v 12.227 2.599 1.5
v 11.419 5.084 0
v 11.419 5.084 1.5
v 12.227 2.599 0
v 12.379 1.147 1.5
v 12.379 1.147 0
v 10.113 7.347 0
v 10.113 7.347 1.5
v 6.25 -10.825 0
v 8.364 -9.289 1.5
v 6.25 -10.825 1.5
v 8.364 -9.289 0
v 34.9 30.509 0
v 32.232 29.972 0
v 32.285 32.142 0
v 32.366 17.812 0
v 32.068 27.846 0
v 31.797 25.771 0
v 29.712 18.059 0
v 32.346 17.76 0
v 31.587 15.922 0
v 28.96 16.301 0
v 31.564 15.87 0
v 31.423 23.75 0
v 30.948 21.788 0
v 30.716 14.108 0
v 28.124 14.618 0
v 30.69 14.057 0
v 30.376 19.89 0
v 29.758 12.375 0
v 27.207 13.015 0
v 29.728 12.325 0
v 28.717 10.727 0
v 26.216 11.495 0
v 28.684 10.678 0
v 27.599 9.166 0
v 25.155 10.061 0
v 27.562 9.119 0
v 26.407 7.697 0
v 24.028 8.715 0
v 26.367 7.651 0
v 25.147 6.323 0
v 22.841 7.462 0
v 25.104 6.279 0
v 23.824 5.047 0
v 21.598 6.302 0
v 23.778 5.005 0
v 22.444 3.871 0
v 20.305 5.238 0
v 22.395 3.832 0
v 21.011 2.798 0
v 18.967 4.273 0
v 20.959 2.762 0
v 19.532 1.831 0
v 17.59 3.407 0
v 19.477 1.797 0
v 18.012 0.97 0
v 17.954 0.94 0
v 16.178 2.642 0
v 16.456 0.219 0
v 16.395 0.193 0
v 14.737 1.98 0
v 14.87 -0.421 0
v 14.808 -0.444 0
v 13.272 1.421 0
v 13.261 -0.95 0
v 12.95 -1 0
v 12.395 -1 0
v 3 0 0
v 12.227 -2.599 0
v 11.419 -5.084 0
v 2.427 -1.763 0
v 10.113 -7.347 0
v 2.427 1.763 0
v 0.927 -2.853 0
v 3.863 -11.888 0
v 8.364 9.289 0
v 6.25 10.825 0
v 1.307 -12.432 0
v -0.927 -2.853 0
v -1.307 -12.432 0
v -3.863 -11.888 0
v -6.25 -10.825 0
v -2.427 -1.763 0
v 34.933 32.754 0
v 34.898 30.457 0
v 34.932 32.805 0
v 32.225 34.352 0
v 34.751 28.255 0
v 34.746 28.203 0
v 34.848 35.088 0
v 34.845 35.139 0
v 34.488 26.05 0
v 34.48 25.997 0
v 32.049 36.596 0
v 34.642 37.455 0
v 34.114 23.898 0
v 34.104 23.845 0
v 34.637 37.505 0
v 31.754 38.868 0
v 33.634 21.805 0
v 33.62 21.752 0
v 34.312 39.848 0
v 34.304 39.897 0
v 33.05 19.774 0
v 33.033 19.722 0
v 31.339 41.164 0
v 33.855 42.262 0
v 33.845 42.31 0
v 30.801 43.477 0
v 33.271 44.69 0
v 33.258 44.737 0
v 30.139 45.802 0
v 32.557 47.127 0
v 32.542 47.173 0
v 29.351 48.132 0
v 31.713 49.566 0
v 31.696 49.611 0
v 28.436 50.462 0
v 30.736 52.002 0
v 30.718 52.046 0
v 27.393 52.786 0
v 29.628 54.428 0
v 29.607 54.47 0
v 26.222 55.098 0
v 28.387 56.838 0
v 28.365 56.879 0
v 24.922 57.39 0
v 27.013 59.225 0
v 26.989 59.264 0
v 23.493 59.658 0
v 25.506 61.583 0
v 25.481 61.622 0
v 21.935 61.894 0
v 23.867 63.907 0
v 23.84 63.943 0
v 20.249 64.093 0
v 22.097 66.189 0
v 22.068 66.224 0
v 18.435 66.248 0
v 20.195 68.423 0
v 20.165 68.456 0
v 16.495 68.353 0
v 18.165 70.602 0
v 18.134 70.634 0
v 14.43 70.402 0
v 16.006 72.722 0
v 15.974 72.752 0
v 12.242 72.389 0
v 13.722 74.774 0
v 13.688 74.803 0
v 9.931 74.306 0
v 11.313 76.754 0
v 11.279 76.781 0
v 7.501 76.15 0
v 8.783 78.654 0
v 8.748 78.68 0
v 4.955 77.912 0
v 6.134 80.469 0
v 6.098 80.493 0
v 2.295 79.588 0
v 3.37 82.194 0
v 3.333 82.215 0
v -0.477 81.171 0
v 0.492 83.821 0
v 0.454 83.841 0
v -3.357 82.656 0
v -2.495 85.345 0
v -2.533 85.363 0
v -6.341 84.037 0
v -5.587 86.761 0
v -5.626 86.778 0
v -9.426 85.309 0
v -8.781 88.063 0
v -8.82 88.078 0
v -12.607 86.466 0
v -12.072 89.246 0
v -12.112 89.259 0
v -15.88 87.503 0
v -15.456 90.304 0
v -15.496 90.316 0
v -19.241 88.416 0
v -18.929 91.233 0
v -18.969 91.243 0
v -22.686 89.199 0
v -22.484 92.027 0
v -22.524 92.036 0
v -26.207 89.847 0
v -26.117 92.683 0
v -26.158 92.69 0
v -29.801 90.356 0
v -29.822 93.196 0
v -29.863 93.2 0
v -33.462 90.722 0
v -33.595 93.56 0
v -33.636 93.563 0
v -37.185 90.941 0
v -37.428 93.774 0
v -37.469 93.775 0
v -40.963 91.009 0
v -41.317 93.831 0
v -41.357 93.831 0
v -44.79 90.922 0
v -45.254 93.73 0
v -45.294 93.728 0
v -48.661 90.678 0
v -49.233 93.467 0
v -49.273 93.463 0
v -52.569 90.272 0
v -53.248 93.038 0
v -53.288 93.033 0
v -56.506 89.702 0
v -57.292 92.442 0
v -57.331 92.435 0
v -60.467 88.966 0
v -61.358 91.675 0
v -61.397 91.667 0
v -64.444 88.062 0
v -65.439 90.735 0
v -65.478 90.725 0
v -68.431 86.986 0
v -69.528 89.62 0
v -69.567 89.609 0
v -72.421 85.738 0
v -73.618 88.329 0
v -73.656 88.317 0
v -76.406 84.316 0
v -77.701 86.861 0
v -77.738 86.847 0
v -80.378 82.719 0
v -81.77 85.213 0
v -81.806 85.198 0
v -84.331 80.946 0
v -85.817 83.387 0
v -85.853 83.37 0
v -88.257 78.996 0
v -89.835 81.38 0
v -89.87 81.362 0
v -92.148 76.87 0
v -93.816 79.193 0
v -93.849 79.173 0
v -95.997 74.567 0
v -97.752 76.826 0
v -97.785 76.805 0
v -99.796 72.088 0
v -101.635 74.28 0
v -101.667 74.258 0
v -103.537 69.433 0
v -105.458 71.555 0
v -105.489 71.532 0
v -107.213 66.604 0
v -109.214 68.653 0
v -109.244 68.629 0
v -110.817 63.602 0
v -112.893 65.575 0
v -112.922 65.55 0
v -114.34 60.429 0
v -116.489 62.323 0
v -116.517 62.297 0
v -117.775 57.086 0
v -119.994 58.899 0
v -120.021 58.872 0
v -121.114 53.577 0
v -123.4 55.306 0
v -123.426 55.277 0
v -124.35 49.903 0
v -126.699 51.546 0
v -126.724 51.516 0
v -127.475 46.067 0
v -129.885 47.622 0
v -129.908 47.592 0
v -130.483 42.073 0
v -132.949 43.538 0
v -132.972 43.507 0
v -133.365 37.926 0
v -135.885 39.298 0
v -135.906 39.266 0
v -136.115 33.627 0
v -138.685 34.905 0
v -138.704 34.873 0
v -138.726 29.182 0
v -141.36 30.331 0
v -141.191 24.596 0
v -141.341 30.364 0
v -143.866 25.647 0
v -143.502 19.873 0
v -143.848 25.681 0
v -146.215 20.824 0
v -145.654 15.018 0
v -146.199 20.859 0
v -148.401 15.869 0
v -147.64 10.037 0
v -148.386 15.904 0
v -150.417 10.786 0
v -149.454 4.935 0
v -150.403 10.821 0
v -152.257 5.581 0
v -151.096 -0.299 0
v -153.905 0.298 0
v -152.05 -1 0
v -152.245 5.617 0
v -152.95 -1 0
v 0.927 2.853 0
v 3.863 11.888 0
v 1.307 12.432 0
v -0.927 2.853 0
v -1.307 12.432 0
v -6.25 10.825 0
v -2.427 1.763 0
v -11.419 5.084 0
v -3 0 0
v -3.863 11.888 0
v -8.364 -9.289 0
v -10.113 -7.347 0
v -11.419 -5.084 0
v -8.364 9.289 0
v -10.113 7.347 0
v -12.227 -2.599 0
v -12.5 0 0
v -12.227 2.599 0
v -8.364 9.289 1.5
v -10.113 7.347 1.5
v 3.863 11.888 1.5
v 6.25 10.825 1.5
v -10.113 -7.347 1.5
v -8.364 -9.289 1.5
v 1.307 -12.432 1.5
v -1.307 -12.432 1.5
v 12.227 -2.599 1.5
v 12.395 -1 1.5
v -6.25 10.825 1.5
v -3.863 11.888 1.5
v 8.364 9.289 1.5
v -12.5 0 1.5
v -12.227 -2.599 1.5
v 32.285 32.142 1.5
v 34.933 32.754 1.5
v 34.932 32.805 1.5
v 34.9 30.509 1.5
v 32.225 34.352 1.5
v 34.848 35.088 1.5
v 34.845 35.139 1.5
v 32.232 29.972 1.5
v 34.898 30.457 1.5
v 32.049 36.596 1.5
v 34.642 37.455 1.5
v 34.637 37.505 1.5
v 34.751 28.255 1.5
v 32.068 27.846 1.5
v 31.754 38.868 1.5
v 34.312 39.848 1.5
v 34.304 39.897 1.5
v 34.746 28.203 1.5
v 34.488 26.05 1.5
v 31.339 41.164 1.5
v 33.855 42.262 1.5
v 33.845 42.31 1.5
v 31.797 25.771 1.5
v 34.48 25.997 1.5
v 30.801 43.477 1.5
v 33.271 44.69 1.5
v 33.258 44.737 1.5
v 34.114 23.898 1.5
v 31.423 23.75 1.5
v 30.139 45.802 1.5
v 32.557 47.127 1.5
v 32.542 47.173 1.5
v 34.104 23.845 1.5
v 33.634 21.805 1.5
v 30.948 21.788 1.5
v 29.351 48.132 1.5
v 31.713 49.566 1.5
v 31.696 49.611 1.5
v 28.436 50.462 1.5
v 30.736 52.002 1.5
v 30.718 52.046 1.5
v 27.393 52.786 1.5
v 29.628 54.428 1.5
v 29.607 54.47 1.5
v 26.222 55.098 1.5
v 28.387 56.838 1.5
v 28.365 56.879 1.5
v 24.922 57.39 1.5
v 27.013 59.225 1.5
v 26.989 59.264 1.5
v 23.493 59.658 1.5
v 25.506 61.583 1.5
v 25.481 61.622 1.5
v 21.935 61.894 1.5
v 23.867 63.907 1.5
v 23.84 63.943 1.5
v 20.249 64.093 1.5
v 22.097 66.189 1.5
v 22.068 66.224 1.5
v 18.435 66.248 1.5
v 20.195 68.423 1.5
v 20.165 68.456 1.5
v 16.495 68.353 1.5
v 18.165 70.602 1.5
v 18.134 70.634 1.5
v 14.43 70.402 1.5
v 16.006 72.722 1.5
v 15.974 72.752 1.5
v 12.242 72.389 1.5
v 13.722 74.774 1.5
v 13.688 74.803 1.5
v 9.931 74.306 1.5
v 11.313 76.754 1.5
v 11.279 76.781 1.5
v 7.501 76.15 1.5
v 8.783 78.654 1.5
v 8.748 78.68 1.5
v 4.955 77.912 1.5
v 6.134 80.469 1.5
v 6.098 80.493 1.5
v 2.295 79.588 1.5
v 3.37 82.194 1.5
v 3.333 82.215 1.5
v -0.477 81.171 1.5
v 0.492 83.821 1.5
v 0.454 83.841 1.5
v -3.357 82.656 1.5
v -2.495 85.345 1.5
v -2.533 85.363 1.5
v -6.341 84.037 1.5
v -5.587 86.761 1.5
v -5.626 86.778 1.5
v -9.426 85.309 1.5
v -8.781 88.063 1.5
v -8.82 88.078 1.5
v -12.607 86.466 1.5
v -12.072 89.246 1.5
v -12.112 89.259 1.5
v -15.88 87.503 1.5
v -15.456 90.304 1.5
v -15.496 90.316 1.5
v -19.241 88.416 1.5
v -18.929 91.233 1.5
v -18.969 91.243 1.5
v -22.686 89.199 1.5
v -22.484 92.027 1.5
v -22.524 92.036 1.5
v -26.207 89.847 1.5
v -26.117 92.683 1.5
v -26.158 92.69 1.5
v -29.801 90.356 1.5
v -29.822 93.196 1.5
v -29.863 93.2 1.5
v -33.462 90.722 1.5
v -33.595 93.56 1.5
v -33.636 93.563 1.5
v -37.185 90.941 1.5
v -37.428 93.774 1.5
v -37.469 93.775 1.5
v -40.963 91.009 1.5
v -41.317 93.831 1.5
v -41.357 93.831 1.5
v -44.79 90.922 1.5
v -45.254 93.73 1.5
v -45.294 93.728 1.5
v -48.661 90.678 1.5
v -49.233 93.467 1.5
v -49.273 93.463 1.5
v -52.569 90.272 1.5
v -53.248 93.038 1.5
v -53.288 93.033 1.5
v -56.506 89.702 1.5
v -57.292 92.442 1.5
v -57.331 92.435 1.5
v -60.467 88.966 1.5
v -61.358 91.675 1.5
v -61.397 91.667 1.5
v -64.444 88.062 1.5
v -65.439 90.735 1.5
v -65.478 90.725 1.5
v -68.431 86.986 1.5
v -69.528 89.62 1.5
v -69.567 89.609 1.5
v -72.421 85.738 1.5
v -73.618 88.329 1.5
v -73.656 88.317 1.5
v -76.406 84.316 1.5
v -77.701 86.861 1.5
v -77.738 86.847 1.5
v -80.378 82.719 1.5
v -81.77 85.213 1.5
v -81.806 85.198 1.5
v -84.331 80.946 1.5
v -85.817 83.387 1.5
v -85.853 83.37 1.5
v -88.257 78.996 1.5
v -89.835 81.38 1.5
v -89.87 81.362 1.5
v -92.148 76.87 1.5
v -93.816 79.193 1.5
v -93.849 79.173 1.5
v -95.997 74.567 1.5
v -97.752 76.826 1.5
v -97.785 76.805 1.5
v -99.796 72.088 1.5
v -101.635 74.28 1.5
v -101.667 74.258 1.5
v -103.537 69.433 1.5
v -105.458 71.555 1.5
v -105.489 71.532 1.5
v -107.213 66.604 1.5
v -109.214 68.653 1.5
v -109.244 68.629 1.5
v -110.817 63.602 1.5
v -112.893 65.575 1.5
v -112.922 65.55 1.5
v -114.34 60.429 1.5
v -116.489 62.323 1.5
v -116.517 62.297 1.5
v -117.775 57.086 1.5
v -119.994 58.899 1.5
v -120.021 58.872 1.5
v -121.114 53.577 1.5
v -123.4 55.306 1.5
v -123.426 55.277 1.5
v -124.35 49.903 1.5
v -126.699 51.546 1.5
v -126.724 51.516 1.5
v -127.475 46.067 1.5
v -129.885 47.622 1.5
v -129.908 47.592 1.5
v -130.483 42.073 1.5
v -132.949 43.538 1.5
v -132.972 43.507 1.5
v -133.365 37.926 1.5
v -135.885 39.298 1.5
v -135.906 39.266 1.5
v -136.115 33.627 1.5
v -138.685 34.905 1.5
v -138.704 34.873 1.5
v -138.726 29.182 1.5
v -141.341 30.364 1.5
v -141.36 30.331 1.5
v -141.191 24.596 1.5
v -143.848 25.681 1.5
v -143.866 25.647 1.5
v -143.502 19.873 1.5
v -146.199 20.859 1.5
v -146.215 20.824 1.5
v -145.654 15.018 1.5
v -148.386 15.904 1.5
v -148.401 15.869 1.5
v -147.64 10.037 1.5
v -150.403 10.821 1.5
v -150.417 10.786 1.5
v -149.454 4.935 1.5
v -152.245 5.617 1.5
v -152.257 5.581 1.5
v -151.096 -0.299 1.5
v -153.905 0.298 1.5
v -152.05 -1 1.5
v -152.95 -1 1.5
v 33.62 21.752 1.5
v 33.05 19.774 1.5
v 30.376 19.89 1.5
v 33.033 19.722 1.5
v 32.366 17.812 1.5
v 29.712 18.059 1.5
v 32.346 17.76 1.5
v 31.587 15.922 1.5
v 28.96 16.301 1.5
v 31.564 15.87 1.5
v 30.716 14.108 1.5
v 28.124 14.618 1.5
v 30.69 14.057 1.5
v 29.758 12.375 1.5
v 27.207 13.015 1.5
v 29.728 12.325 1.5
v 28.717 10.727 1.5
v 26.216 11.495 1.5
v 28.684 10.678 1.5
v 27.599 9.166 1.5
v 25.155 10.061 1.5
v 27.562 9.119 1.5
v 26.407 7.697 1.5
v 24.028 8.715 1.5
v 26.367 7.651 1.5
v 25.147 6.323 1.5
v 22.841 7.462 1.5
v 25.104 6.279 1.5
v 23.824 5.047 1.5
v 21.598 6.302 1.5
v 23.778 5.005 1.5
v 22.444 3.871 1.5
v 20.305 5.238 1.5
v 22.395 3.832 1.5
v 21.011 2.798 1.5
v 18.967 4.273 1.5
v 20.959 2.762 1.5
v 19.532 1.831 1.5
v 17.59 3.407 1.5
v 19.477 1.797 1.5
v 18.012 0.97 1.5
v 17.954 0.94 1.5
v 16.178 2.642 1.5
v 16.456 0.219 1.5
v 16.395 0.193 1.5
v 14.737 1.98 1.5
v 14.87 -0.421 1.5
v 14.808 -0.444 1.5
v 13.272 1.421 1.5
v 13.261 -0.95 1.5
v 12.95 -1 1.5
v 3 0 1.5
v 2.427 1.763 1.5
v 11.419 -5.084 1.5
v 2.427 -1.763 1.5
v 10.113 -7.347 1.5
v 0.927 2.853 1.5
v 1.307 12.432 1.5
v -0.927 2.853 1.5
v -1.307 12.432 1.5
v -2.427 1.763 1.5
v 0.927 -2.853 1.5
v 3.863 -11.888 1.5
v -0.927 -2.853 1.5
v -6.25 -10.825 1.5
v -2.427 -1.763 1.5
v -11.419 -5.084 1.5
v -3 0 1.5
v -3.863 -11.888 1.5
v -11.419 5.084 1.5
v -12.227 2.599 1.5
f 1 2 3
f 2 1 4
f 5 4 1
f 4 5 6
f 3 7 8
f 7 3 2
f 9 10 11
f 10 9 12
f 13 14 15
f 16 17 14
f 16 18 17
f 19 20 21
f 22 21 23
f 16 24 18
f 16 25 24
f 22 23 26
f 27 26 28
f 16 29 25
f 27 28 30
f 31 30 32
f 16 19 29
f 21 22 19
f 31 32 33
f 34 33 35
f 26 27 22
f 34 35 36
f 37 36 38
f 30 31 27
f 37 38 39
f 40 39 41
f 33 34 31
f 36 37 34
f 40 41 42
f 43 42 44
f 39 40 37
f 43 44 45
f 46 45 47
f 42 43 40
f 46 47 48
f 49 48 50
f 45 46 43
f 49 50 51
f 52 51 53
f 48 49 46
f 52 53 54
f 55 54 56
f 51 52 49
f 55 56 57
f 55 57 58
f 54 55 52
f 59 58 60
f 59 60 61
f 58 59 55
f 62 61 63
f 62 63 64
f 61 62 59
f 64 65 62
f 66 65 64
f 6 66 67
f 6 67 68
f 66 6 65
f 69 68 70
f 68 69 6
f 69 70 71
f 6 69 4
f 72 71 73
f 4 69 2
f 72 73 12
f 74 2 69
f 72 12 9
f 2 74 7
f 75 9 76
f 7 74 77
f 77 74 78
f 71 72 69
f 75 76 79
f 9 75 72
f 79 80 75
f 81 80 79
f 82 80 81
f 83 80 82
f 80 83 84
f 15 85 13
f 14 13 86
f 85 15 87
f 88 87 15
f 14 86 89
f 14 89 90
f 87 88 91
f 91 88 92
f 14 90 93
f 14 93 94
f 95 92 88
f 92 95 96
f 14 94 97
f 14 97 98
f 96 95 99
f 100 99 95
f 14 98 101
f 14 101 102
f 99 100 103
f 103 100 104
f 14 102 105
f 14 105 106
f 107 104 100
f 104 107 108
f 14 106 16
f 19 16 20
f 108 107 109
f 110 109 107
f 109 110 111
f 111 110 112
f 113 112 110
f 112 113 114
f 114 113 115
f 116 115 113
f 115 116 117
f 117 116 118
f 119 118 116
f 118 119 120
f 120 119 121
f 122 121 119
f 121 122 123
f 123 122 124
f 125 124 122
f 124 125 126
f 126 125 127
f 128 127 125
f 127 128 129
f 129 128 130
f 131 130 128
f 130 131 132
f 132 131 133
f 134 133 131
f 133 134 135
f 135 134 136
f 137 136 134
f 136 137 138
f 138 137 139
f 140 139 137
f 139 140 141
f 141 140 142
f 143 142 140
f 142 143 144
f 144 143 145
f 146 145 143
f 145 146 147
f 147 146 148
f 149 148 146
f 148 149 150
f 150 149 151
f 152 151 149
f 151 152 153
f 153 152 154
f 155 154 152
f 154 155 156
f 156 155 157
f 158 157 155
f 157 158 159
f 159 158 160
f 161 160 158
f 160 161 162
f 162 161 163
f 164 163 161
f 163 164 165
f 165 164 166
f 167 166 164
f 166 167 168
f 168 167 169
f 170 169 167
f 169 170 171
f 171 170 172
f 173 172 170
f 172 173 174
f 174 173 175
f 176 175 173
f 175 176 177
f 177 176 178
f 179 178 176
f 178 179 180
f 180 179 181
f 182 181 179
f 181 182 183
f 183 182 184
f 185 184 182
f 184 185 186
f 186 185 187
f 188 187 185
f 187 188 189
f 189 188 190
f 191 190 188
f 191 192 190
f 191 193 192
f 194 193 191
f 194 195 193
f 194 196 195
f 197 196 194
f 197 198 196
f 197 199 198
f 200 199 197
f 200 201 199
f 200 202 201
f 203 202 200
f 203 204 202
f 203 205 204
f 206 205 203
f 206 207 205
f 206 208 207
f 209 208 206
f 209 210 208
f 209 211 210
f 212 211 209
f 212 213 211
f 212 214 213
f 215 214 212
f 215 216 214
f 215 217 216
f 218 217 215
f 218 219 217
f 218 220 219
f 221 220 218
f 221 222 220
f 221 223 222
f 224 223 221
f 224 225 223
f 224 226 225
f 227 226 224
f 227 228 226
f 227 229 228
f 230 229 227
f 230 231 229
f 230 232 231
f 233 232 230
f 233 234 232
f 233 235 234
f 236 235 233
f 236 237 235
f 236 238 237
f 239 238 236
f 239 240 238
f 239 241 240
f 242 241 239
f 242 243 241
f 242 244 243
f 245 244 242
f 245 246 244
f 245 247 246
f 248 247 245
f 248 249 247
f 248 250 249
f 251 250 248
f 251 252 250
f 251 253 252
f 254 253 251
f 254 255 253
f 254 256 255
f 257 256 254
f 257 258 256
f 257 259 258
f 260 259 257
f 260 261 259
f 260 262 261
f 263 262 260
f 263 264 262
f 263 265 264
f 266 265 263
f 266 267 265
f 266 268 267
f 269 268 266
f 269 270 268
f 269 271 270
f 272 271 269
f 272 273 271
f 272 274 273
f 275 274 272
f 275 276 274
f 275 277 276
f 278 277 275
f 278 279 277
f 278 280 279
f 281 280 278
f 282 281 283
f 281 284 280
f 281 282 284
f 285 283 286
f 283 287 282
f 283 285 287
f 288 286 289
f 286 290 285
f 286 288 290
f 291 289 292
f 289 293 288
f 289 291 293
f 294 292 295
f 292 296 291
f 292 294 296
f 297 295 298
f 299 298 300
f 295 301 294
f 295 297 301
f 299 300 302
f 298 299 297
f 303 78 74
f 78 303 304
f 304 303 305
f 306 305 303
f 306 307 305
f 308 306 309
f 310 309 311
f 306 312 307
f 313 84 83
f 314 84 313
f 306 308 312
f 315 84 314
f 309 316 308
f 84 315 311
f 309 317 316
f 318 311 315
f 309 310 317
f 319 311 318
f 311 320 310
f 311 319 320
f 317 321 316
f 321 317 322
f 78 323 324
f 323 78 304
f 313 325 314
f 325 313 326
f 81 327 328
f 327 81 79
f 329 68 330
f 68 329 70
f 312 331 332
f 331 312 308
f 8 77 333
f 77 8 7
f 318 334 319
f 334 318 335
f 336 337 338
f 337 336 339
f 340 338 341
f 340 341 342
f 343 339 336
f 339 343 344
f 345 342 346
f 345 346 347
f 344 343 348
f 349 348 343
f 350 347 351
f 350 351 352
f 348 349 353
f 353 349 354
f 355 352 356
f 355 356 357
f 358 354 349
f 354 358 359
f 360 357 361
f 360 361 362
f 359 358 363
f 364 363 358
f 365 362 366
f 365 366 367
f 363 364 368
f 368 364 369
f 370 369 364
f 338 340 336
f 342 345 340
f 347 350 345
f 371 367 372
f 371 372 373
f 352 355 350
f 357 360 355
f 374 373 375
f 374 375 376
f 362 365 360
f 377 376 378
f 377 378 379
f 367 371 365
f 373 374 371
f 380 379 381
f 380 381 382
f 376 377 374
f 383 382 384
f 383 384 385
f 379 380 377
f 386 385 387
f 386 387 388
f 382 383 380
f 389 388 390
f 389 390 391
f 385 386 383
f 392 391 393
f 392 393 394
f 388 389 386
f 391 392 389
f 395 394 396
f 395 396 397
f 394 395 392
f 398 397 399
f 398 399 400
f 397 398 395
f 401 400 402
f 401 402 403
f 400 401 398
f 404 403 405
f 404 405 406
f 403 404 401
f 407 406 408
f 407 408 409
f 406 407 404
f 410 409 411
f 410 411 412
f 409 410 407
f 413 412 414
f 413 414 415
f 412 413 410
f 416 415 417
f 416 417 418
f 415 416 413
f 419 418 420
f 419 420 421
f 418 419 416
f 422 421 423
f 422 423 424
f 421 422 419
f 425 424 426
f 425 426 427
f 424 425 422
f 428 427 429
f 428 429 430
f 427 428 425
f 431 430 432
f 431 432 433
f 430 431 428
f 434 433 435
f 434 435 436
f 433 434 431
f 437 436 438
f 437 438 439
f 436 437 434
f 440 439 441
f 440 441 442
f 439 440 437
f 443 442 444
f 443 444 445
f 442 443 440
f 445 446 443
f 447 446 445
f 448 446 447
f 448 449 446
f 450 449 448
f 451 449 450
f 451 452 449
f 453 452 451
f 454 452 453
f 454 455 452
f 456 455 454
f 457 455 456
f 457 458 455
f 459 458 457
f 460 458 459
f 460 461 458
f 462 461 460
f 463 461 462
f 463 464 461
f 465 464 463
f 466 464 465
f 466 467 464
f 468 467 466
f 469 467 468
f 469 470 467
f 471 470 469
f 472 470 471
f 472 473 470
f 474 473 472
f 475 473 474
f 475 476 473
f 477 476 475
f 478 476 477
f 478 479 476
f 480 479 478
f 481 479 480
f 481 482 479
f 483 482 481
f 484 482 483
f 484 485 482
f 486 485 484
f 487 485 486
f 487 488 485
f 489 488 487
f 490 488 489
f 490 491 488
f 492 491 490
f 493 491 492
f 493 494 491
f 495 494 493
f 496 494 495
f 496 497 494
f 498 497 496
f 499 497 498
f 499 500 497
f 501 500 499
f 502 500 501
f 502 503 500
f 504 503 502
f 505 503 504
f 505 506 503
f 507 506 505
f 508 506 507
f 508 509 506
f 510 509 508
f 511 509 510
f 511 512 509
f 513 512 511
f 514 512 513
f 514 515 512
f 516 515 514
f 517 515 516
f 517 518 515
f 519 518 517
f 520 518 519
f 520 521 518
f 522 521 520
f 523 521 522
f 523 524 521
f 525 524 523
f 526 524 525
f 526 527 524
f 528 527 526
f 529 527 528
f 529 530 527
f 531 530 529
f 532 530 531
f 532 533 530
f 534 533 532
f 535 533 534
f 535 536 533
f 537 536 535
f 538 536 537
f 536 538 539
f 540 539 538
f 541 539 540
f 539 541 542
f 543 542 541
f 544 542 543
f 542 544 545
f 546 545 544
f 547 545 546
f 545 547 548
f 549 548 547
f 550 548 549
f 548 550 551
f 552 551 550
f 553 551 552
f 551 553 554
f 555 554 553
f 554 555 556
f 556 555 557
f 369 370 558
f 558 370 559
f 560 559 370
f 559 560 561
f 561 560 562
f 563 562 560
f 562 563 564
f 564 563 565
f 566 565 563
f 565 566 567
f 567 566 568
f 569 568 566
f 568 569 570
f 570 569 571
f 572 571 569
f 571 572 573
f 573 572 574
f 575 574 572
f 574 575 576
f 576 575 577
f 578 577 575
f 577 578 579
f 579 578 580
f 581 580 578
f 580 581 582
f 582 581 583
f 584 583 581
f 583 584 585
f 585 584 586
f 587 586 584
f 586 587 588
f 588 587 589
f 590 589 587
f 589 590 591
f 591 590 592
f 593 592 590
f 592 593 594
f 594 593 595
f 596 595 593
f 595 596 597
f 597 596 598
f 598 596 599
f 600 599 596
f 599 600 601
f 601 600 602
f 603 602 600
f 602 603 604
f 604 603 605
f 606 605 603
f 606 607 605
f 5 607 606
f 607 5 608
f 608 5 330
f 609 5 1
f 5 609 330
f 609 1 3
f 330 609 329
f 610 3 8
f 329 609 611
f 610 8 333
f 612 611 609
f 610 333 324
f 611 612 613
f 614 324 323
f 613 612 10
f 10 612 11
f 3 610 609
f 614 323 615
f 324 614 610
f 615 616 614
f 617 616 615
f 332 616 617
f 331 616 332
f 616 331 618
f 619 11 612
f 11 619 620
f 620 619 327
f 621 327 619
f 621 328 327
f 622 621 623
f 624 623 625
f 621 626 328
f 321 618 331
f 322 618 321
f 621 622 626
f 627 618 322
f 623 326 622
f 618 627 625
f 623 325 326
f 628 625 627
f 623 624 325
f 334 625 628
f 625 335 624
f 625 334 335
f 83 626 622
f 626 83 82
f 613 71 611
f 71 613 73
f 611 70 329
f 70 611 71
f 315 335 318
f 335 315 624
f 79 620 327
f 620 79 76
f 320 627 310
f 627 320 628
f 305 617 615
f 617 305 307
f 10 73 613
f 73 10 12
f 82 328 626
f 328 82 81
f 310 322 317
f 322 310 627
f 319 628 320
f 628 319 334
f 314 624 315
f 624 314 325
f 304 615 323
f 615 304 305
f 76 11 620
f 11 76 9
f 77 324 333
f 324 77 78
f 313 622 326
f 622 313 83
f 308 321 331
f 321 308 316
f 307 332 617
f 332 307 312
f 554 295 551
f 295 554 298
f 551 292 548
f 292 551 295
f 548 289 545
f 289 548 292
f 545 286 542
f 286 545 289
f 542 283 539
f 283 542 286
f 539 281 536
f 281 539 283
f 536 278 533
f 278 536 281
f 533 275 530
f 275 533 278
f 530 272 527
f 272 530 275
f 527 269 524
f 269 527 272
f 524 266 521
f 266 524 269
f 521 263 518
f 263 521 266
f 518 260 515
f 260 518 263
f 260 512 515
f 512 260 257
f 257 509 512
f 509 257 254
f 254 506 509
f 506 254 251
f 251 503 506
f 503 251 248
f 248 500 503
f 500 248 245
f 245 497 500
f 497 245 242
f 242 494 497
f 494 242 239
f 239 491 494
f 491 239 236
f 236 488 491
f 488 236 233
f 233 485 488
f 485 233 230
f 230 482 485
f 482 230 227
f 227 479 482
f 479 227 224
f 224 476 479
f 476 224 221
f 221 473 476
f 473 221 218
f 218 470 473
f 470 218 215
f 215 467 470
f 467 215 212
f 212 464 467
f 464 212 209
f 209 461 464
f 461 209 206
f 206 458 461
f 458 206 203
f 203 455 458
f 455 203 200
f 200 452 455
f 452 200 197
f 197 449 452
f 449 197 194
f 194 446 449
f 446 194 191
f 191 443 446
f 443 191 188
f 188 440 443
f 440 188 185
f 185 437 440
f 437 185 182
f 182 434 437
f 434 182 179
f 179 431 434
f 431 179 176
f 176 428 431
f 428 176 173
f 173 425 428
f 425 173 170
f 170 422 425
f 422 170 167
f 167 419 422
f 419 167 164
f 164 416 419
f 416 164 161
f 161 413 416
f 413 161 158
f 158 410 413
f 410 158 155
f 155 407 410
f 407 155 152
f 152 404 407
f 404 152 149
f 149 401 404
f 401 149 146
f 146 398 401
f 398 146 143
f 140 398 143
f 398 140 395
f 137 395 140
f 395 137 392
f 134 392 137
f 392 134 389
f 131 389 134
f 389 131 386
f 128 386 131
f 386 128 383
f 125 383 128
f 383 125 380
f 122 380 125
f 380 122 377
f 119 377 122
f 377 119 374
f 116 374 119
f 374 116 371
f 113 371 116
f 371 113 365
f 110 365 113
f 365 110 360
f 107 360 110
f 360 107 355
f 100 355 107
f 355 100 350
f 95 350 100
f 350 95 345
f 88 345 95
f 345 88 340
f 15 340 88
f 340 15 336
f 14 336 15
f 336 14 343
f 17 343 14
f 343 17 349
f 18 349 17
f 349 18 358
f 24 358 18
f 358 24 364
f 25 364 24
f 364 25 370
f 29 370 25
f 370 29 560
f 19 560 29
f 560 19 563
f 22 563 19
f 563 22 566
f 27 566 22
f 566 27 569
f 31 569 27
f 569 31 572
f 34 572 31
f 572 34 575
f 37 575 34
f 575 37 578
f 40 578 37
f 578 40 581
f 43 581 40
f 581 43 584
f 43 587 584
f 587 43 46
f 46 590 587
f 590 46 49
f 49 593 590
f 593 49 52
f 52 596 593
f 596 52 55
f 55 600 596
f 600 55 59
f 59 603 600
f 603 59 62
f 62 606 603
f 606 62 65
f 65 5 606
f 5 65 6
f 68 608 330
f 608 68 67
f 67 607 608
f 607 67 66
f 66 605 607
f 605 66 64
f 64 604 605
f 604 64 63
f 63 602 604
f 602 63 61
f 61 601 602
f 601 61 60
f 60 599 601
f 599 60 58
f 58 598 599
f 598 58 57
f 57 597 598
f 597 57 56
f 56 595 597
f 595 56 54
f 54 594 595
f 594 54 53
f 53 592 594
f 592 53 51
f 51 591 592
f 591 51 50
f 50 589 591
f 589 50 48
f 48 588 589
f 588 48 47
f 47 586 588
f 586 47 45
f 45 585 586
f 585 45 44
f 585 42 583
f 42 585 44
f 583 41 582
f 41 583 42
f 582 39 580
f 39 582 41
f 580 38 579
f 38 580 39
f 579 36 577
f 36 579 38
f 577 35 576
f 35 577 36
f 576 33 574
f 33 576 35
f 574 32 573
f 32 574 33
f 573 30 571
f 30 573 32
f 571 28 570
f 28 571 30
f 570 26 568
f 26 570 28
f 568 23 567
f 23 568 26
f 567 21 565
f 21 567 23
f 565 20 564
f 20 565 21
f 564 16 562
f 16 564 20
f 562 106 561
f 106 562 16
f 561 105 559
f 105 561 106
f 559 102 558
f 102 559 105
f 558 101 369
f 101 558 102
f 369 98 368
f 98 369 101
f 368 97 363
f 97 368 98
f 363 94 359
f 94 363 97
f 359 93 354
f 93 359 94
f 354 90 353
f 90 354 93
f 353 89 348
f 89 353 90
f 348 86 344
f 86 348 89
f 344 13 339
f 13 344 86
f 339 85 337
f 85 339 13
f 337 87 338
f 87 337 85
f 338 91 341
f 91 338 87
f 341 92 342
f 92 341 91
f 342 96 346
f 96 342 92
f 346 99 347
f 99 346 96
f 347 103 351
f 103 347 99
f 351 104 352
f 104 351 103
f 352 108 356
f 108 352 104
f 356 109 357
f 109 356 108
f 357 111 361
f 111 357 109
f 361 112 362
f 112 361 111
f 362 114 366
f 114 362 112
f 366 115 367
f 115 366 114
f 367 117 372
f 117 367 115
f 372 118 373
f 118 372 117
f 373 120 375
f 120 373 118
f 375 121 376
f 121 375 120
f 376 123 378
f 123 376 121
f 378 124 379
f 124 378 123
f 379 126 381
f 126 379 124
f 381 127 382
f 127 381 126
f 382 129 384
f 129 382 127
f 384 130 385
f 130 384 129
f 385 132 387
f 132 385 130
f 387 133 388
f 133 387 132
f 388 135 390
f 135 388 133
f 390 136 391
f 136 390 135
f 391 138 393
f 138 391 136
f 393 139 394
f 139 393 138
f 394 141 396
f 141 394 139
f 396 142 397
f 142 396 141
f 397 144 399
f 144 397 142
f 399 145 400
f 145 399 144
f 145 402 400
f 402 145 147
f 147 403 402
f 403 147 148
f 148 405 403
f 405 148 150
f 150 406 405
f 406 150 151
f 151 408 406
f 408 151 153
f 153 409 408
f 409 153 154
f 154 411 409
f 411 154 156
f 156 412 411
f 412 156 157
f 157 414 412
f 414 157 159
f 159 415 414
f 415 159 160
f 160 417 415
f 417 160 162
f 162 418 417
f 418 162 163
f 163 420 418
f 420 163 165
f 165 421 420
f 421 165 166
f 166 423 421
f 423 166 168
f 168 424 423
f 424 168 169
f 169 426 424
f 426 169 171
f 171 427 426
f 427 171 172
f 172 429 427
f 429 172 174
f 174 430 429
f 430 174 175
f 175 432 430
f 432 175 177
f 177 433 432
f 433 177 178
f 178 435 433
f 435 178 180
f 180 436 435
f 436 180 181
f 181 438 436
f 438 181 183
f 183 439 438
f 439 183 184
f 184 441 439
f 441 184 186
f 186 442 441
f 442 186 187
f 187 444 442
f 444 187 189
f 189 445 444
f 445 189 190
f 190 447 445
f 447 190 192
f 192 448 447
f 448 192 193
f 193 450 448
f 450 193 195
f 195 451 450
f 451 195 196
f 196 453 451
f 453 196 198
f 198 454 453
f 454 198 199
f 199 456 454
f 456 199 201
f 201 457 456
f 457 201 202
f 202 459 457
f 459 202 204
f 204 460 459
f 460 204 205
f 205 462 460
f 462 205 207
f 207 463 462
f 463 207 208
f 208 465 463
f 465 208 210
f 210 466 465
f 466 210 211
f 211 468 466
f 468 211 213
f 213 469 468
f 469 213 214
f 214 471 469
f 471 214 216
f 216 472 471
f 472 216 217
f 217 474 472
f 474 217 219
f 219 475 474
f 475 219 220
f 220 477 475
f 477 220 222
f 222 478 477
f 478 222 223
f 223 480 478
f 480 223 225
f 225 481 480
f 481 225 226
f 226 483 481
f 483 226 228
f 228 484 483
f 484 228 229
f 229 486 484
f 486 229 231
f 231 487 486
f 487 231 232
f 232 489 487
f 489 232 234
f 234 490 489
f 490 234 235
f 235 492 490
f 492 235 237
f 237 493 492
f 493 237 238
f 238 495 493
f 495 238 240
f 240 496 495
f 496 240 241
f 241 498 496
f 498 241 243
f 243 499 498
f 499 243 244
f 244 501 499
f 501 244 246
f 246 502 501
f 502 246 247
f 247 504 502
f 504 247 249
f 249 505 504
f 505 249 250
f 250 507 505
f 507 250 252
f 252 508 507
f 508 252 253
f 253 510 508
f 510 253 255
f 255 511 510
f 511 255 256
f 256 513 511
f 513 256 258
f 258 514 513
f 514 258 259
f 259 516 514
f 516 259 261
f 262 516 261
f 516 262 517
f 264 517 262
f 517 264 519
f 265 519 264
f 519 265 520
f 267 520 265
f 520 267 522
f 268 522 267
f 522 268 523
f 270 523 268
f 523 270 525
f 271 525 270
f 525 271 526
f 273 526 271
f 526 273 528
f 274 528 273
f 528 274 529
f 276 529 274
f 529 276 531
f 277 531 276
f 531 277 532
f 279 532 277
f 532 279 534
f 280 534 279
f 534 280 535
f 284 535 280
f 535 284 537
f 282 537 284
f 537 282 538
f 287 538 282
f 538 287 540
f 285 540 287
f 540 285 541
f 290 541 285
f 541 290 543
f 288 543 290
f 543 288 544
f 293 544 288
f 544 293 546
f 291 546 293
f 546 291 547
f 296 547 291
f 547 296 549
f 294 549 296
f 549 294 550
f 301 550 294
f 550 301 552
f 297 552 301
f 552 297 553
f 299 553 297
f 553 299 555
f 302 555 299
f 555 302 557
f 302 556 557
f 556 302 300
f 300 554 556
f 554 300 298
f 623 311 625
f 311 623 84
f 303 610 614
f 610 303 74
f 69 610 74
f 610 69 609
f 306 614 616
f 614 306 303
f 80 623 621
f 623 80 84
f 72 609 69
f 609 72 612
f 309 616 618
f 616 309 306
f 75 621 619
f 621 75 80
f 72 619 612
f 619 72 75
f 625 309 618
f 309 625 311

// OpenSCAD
echo(version=version() );

                        // All units are millimetres
height = 1.5;           // The thickness of the clock hand
stepCount = 2;
radiusLength = 140 * 2; // The maximum length of the clock hand at 360 degrees
centreRadius =  25/2;    // The radius of the centre disk
holeRadius = 6/2;       // The radius of the hole in the centre of the centre disk
width=4.5;              // The width of the clock hand

function xPos(angle, centreRadius, offset) = 
    
    (cos(angle) * ((radiusLength * angle / 360) + centreRadius) 
     + (sin(90-angle) * offset));

function yPos(angle, centreRadius, offset) = 
    (sin(angle) * ((radiusLength * angle / 360) + centreRadius) 
    + (cos(90-angle) * offset));

function startCoordinate(angle, centreRadius, offset) = [xPos(angle, centreRadius, offset),yPos(angle, centreRadius, offset)];

function clockPoints(holeRadius, centreRadius, width, degreeCount) =
   concat([ for (angle = [ 0 : stepCount : degreeCount ]) 
       startCoordinate(angle, centreRadius, width / 10) ],       
   [ for (angle = [ 0 : stepCount : degreeCount ]) 
       startCoordinate(angle, centreRadius, width / -10) ]);
    
points = clockPoints(holeRadius, centreRadius, width,180);
difference(){
    union() {
    cylinder(height,centreRadius,centreRadius);
    
    linear_extrude(height,true)  
        offset(r=1)
            polygon (points);
    };
    translate([0,0,-1])
        cylinder(10,holeRadius,holeRadius);
}
echo (points);
